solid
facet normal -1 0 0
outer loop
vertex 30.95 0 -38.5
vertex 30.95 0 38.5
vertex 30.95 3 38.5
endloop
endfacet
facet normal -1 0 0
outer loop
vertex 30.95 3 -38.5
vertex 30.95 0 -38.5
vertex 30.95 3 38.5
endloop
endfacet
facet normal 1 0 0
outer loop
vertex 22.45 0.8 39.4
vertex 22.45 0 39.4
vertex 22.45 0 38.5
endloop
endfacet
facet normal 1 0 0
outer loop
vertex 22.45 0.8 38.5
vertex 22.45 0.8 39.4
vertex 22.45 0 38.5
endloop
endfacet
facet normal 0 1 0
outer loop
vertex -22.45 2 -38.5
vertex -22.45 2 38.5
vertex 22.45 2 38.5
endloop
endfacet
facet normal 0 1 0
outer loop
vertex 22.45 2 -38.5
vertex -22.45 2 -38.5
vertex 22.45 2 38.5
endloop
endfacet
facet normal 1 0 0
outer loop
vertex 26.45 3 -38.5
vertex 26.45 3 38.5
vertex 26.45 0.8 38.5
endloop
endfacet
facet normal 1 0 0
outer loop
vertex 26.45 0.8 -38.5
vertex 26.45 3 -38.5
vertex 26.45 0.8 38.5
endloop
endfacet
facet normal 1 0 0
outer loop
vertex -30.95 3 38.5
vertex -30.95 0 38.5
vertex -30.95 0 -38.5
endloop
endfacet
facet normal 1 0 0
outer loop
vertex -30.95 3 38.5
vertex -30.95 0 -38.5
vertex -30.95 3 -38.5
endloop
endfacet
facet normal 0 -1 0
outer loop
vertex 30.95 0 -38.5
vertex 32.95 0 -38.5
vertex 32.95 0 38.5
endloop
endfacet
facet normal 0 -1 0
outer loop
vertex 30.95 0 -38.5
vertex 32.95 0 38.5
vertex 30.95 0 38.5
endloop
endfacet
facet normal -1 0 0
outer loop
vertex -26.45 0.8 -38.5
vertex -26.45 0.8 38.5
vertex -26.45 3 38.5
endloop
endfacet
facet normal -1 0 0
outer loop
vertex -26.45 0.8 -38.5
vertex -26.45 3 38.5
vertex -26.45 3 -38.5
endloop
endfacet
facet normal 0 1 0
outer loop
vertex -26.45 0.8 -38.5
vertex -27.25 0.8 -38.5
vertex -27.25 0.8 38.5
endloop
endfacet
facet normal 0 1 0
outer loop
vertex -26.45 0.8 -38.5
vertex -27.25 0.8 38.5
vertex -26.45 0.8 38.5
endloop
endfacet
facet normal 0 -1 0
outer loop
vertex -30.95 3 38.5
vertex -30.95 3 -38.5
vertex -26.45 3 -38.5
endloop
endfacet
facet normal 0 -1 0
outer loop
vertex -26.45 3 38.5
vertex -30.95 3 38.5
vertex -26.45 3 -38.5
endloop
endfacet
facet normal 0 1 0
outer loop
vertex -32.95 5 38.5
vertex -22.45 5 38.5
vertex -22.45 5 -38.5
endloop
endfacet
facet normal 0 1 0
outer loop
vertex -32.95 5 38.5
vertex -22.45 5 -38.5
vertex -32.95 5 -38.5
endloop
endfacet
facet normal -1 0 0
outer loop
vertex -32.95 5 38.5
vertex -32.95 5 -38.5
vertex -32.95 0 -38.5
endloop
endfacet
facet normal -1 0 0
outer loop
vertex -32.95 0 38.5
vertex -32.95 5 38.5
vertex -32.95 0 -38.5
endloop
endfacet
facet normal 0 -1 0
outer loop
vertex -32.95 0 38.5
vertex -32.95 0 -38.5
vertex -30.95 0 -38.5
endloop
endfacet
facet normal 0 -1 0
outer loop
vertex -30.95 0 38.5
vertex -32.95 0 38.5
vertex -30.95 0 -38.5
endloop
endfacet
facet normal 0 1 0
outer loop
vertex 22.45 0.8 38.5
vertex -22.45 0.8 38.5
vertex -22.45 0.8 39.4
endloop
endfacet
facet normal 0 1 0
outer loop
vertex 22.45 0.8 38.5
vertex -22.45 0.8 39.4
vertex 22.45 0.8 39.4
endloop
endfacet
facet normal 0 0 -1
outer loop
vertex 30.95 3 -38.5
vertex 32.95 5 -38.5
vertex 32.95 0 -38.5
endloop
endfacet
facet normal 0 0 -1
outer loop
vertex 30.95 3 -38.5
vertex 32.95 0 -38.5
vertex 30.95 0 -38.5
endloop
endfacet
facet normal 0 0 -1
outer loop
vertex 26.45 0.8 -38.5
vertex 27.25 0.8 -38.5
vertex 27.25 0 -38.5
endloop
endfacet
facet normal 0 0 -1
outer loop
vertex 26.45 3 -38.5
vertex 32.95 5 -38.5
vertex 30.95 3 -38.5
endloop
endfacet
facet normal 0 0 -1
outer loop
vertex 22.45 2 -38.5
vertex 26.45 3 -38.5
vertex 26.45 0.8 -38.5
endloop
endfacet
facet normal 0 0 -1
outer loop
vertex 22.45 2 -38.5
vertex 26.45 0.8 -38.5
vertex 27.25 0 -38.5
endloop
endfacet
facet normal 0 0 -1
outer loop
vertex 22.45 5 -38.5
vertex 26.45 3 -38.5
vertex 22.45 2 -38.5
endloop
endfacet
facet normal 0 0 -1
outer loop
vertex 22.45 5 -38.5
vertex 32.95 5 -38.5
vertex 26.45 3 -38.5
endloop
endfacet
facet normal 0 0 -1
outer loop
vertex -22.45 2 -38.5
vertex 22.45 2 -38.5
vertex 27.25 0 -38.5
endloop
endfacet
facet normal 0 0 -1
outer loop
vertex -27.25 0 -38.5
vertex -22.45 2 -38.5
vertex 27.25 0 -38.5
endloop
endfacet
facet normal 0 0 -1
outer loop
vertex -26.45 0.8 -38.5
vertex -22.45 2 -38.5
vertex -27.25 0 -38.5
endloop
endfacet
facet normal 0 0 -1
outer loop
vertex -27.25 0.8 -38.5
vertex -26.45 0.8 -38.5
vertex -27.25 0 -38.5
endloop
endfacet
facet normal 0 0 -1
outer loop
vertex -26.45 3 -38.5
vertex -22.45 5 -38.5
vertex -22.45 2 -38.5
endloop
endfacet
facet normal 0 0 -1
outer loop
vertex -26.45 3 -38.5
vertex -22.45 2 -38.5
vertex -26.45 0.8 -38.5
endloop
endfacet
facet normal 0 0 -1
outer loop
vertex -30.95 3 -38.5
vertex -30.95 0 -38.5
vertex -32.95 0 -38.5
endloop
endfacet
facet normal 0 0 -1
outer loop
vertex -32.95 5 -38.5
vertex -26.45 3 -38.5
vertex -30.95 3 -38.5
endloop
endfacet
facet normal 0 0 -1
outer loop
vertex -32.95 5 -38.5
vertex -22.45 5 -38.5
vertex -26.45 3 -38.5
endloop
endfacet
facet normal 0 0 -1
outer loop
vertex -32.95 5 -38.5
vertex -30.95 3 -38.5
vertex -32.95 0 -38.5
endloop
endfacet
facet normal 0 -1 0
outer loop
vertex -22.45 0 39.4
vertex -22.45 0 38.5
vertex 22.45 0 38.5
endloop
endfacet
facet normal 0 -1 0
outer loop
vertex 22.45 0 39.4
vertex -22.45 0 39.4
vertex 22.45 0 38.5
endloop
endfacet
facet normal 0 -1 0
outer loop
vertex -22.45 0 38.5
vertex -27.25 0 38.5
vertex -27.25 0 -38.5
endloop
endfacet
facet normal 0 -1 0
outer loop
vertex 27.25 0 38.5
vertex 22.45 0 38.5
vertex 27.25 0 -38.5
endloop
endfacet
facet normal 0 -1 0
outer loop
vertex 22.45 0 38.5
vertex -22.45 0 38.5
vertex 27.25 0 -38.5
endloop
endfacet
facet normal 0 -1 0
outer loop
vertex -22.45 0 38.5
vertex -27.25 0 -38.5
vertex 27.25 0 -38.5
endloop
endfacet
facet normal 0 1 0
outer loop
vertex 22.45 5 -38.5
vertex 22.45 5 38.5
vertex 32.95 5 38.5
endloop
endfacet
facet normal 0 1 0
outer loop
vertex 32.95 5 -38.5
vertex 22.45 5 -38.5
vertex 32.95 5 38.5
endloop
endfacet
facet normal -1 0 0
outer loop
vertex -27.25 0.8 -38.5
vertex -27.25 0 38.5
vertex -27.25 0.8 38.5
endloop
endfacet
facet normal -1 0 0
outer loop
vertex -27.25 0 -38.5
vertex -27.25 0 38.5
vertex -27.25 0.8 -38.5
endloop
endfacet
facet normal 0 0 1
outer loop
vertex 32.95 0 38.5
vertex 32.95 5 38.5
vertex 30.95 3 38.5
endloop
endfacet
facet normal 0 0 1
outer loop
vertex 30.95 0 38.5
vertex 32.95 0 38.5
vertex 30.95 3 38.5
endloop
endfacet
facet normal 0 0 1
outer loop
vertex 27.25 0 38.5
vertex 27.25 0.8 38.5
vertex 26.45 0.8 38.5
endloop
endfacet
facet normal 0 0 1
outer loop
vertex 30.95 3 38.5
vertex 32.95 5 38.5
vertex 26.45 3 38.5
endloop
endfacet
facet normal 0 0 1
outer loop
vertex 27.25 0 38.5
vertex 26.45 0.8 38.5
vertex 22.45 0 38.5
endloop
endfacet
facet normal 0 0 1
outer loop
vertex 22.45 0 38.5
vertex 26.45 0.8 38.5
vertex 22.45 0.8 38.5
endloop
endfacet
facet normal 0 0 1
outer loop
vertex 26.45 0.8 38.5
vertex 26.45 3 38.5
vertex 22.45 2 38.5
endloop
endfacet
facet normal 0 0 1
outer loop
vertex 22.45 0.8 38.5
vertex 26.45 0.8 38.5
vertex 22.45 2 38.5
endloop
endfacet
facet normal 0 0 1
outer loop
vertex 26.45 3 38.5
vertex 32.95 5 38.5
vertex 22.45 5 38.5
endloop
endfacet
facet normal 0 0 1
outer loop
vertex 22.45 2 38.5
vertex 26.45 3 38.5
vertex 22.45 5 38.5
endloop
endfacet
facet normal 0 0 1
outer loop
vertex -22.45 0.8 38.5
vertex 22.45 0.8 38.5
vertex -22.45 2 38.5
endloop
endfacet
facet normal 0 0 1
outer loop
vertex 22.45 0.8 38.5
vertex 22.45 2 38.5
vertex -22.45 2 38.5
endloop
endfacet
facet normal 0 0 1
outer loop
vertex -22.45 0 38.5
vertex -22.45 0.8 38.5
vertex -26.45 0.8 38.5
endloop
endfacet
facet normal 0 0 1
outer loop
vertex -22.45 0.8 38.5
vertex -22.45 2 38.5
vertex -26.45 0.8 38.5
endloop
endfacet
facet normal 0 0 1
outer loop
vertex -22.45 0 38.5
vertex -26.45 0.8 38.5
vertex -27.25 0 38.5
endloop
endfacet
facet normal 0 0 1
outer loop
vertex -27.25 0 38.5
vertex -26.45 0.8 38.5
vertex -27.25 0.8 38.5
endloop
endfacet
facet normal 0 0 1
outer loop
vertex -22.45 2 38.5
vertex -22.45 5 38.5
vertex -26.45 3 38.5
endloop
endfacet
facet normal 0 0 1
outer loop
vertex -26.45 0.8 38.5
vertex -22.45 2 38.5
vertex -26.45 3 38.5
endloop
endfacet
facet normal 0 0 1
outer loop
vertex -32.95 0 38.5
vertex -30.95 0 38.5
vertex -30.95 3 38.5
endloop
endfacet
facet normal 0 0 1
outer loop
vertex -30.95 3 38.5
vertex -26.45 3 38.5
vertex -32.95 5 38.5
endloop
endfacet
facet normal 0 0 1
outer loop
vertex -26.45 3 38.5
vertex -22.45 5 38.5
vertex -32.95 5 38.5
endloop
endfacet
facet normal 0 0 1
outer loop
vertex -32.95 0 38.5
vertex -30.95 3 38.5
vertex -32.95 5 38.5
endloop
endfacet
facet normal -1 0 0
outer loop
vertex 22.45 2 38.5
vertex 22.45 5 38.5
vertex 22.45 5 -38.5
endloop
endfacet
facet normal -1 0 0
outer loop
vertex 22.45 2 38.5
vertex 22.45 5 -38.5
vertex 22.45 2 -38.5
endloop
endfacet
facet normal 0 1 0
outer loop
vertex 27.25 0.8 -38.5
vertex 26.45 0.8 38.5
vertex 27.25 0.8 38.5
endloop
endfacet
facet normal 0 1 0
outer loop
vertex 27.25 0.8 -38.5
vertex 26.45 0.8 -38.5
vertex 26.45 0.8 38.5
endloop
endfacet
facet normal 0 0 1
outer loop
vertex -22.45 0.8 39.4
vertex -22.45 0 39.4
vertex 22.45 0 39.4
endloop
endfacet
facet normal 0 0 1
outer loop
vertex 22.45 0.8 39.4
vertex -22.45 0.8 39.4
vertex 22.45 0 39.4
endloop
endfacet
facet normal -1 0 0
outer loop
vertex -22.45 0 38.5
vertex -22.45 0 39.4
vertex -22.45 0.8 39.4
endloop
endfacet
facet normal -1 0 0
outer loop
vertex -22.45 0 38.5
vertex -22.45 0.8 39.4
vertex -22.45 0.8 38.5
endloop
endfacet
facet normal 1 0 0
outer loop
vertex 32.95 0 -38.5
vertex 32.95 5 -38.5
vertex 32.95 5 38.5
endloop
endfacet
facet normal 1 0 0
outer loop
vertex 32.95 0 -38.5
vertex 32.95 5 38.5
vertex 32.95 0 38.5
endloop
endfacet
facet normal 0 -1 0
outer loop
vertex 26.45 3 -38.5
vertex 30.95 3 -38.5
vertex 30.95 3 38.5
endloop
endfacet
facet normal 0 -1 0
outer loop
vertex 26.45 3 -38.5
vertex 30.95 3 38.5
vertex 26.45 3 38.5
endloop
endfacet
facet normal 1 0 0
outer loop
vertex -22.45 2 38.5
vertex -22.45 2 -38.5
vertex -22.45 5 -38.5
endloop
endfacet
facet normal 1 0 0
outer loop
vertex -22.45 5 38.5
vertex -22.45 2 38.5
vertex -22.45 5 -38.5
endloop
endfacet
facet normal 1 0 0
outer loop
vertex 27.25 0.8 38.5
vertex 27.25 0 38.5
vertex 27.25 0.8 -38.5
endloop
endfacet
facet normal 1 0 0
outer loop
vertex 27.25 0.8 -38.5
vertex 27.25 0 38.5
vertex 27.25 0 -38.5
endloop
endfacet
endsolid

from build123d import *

# Parameters (mm, degrees)
SKETCH_1_W          = 52.9
SKETCH_1_H          = 77
EXTRUDE_1_DEPTH     = 2
SKETCH_1_3_W        = 0.8
SKETCH_1_3_H        = 77
EXTRUDE_2_DEPTH     = 0.8
SKETCH_2_W          = 54.5
SKETCH_2_H          = 0.9
EXTRUDE_3_DEPTH     = 0.8
SKETCH_3_W          = 4.8
SKETCH_3_H          = 0.9
CUT_EXTRUDE_1_DEPTH = 0.8
EXTRUDE_START       = -38.5
EXTRUDE_4_DEPTH     = 77


with BuildPart() as part:
    # 草图1 → 凸台-拉伸1 (new body)
    with BuildSketch(Plane(origin=(0, 0, 0), x_dir=(1, 0, 0), z_dir=(0, 1, 0))):
        Rectangle(SKETCH_1_W, SKETCH_1_H)
    extrude(amount=EXTRUDE_1_DEPTH)

    # 草图1<3> → 凸台-拉伸2 (add)
    with BuildSketch(Plane(origin=(0, 0, 0), x_dir=(1, 0, 0), z_dir=(0, 1, 0))):
        with Locations((26.85, 0)):
            Rectangle(SKETCH_1_3_W, SKETCH_1_3_H)
        with Locations((-26.85, 0)):
            Rectangle(SKETCH_1_3_W, SKETCH_1_3_H)
    extrude(amount=EXTRUDE_2_DEPTH)

    # 草图2 → 凸台-拉伸3 (add)
    with BuildSketch(Plane(origin=(0, 0, 0), x_dir=(1, 0, 0), z_dir=(0, 1, 0))):
        with Locations((0, -38.95)):
            Rectangle(SKETCH_2_W, SKETCH_2_H)
    extrude(amount=EXTRUDE_3_DEPTH)

    # 草图3 → 切除-拉伸1 (cut)
    with BuildSketch(Plane(origin=(0, 0, 0), x_dir=(1, 0, 0), z_dir=(0, 1, 0))):
        with Locations((-24.85, -38.95)):
            Rectangle(SKETCH_3_W, SKETCH_3_H)
        with Locations((24.85, -38.95)):
            Rectangle(SKETCH_3_W, SKETCH_3_H)
    extrude(amount=CUT_EXTRUDE_1_DEPTH, mode=Mode.SUBTRACT)

    # 草图4 → 凸台-拉伸4 (add)
    with BuildSketch(Plane.XY.offset(EXTRUDE_START)):
        Polygon((22.45, 3), (22.45, 5), (32.95, 5), (32.95, 0), (30.95, 0), (30.95, 3), (26.45, 3), (26.45, 2), (22.45, 2), align=None)
        Polygon((-30.95, 0), (-30.95, 3), (-26.45, 3), (-26.45, 2), (-22.45, 2), (-22.45, 3), (-22.45, 5), (-32.95, 5), (-32.95, 0), align=None)
    extrude(amount=EXTRUDE_4_DEPTH)


solid = part.part
